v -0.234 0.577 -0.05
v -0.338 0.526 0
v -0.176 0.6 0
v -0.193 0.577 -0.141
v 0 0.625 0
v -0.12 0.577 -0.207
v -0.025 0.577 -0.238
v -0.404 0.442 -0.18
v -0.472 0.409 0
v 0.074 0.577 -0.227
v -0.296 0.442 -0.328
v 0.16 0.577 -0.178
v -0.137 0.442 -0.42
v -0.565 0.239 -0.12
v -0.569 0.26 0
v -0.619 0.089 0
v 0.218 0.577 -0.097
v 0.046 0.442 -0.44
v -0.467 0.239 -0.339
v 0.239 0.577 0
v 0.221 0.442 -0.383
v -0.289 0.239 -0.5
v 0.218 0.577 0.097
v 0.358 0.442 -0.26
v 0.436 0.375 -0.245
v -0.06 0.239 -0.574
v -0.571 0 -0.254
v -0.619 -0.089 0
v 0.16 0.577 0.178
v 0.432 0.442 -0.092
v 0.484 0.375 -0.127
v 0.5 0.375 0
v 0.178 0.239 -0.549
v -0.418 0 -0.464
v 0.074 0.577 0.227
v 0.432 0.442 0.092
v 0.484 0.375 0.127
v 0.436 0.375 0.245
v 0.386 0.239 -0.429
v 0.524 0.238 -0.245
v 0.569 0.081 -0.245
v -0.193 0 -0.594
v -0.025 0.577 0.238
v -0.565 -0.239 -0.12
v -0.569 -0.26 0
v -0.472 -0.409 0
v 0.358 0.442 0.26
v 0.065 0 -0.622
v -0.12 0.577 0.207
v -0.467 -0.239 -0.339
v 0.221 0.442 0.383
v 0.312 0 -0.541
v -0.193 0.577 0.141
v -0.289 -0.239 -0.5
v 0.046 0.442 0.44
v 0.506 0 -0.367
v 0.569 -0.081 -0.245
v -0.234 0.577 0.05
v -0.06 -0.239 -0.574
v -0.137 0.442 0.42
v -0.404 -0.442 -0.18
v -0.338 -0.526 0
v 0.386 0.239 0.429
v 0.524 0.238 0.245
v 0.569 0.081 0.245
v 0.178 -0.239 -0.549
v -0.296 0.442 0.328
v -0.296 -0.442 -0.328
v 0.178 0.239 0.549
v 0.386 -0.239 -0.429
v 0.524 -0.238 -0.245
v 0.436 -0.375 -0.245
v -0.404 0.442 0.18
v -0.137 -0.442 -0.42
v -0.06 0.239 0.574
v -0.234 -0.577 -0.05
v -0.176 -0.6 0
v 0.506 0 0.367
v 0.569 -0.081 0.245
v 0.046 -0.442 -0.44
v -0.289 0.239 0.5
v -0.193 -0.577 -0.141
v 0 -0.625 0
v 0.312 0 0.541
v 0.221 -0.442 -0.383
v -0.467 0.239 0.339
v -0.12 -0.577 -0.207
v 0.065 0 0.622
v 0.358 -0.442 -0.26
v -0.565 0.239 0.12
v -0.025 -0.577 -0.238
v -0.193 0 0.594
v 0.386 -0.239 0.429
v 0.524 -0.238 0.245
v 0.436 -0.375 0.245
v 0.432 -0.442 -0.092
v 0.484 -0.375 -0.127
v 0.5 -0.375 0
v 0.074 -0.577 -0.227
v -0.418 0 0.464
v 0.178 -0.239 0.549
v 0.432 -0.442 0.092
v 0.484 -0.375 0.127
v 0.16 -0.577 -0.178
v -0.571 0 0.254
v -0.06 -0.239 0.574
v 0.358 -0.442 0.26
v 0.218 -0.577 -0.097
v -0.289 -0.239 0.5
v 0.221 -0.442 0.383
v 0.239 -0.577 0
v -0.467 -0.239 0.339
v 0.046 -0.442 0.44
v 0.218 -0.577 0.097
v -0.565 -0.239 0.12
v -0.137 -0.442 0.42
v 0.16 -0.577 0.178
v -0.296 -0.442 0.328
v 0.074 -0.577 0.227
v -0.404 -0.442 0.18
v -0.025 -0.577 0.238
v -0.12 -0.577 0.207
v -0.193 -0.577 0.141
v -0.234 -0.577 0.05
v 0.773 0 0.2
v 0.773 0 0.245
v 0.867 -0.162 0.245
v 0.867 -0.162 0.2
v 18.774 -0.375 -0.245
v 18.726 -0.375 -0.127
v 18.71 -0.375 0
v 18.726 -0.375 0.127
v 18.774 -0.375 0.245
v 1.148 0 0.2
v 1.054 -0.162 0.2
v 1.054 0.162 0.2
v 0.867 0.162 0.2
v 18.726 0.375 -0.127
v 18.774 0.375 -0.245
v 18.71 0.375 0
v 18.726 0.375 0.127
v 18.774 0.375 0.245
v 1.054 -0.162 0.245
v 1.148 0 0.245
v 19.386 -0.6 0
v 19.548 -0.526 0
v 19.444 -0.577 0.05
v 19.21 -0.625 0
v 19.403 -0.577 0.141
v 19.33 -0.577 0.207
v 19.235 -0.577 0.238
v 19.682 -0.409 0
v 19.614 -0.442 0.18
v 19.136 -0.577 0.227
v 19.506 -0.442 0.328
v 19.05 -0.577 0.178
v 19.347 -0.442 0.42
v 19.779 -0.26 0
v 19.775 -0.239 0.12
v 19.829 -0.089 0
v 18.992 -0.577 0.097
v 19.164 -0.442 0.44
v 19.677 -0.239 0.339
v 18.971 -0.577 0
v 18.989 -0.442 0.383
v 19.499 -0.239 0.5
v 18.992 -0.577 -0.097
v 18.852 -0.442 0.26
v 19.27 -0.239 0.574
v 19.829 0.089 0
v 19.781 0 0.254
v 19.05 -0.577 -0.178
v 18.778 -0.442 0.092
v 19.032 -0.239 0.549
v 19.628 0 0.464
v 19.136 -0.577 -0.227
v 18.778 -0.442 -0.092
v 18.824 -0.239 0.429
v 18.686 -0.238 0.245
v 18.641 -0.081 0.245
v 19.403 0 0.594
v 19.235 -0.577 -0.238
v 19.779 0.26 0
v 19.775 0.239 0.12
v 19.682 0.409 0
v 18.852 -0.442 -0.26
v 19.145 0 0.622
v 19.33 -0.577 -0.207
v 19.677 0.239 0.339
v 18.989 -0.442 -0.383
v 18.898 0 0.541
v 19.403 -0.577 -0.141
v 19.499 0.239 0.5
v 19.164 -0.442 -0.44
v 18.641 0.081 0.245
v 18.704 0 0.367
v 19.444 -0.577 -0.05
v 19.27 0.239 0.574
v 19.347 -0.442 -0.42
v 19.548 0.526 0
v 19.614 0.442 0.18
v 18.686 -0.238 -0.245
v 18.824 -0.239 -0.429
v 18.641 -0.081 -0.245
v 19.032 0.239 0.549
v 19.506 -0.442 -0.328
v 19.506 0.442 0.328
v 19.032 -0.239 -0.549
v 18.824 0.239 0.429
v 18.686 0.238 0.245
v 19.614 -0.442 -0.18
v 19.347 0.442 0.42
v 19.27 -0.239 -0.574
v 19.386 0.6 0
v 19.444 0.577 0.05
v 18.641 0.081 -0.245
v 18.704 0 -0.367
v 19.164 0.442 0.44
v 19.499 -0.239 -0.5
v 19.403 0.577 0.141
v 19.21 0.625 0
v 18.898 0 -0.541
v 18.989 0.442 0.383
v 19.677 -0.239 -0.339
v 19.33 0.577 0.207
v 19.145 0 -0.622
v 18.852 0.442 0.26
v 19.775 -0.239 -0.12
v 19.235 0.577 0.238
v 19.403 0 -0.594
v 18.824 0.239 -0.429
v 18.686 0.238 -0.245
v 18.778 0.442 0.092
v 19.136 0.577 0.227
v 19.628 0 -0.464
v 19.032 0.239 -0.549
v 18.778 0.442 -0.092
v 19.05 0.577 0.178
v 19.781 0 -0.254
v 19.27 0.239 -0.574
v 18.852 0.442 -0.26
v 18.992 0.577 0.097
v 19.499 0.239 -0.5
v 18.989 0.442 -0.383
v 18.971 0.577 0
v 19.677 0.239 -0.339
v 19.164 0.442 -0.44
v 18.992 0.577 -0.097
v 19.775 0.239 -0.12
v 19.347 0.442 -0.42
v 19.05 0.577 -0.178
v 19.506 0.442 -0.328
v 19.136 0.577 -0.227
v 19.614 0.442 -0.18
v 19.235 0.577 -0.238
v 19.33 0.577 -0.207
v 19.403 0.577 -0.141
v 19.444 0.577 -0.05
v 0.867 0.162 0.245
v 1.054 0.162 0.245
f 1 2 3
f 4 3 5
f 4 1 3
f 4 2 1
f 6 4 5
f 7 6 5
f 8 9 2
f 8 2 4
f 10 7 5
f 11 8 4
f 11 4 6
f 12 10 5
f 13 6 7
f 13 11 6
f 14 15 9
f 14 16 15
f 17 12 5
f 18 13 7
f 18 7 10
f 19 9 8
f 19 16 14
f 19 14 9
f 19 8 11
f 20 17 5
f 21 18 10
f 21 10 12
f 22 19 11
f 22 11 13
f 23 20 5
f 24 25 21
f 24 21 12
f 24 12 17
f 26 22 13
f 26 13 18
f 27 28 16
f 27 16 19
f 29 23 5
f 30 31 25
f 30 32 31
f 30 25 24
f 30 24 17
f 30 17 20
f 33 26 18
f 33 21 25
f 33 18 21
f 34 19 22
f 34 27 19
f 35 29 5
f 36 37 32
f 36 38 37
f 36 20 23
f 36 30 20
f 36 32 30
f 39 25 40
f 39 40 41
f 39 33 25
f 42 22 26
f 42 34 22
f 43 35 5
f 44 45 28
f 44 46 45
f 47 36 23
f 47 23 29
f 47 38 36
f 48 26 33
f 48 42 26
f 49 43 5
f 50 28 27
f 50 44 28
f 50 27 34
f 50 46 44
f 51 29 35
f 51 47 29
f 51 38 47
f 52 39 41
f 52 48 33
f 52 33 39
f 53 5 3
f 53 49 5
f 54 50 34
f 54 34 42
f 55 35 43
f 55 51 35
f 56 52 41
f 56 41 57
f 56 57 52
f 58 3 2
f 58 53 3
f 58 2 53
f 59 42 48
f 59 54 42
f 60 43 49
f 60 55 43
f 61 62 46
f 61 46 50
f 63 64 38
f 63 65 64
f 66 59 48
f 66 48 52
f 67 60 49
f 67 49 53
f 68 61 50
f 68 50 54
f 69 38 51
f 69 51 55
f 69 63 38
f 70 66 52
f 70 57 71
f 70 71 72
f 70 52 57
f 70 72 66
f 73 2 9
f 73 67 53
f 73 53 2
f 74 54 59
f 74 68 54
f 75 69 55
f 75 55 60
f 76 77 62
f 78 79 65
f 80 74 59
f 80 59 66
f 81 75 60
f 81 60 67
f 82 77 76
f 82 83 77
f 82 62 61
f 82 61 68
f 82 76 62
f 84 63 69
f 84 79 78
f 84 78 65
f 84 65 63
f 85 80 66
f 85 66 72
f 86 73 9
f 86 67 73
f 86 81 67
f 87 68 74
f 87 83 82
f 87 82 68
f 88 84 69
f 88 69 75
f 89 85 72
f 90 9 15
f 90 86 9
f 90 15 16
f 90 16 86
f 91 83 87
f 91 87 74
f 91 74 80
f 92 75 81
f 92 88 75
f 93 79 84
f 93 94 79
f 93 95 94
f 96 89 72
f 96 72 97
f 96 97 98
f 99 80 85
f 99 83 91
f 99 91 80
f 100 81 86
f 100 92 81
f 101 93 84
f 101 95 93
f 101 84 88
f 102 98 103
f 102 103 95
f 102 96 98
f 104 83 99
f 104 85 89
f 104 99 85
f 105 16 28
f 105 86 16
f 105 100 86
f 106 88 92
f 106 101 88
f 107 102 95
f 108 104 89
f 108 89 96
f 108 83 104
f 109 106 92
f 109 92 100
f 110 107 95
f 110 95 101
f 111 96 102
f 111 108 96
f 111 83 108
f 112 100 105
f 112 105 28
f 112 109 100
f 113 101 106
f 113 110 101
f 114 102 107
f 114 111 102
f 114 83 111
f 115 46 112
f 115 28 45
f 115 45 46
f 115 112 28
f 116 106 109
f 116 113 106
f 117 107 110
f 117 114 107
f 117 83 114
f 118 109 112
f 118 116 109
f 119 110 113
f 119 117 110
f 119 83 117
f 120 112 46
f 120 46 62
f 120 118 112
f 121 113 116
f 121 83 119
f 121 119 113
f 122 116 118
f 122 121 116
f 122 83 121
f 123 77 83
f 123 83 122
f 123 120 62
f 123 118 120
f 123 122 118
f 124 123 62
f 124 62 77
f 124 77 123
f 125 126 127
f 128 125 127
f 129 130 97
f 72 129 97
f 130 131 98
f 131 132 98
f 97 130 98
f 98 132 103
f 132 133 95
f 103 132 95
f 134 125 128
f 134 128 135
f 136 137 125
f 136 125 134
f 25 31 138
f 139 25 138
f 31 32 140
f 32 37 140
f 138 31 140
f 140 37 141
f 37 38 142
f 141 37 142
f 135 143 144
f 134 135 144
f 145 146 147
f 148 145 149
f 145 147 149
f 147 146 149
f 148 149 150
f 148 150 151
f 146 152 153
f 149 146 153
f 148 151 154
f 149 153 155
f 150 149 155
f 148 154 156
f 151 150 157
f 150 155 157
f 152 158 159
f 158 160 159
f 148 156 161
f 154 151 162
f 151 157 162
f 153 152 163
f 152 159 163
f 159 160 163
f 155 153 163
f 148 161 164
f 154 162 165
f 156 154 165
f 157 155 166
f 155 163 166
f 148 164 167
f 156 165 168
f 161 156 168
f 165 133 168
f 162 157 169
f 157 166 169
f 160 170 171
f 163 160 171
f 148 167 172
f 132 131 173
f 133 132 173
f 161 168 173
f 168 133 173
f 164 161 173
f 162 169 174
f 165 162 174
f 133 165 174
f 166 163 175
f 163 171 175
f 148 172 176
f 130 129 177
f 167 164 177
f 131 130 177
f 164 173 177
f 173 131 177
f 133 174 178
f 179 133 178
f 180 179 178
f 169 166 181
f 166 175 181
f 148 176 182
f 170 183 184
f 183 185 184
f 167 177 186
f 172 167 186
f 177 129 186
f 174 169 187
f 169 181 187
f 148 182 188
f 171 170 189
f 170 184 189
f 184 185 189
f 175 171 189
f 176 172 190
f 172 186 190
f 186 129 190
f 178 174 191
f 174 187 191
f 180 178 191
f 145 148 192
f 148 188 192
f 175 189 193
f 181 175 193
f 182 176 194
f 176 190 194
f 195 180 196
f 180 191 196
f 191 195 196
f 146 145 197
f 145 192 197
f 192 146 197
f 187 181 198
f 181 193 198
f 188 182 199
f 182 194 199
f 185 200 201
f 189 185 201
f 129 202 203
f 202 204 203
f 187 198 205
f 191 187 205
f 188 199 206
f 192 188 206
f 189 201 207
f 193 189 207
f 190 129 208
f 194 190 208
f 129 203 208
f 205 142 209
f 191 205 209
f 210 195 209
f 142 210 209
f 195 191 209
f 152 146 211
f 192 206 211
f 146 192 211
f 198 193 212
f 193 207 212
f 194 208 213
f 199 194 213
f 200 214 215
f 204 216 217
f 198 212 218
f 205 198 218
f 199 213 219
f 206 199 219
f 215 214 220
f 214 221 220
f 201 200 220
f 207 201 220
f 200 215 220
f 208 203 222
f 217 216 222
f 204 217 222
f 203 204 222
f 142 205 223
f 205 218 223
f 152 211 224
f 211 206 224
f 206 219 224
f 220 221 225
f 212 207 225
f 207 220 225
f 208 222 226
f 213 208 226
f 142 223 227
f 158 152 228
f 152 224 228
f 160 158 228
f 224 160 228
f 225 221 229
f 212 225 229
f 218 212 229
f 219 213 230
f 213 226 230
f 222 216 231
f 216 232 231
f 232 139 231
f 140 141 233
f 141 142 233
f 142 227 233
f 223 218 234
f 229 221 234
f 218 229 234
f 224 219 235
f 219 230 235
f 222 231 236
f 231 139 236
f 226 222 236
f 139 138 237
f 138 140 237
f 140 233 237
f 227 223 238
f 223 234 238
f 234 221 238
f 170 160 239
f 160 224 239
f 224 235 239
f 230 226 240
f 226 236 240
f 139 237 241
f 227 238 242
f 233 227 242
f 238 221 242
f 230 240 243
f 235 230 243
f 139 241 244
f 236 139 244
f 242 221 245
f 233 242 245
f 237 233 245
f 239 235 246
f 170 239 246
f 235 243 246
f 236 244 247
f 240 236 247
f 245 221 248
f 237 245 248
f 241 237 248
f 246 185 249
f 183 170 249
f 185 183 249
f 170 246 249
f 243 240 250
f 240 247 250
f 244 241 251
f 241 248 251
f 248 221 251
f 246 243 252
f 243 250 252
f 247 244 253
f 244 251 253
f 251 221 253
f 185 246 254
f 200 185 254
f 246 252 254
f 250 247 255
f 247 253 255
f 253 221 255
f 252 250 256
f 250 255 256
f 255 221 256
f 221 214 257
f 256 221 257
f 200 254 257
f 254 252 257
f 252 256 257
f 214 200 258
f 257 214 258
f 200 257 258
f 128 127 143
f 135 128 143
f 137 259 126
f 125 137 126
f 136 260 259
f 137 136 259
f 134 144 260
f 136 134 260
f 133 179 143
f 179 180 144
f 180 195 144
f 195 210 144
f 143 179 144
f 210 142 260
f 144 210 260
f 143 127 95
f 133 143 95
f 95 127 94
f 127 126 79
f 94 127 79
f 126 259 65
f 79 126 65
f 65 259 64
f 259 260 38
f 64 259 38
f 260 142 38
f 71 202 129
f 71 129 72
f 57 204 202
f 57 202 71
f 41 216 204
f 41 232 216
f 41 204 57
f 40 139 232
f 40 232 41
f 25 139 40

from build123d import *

# Parameters (mm, degrees)
PAD_DEPTH    = 0.245
POCKET_DEPTH = 0.05


with BuildPart() as part:
    # Sketch → Pad (new body, symmetric)
    with BuildSketch(Plane.XY):
        with BuildLine():
            Line((0, 0.375), (19.21, 0.375))
            ThreePointArc((19.21, -0.375), (19.585, 0), (19.21, 0.375))
            Line((19.21, -0.375), (0, -0.375))
            ThreePointArc((0, 0.375), (-0.375, 0), (0, -0.375))
        make_face()
    extrude(amount=PAD_DEPTH, both=True)

    # Sketch001 → Revolution (revolve)
    with BuildSketch(Plane.XY):
        with BuildLine():
            Line((0, 0.625), (0, 0))
            Line((0, 0), (0, -0.625))
            ThreePointArc((0, 0.625), (-0.625, 0), (0, -0.625))
        make_face()
    revolve(axis=Axis((0, 0, 0), (0, -1, 0)))

    # Sketch002 → Revolution001 (revolve)
    with BuildSketch(Plane.XY):
        with BuildLine():
            ThreePointArc((19.21, -0.625), (19.835, 0), (19.21, 0.625))
            Line((19.21, 0.625), (19.21, 0))
            Line((19.21, 0), (19.21, -0.625))
        make_face()
    revolve(axis=Axis((19.21, 0, 0), (0, -1, 0)))

    # Sketch003 (on DatumPlane) → Pocket (cut)
    with BuildSketch(Plane.XY.offset(0.25)):
        Polygon((1.05425, -0.16238), (1.148, 0), (1.05425, 0.16238), (0.86675, 0.16238), (0.773, 0), (0.86675, -0.16238), align=None)
    extrude(amount=-POCKET_DEPTH, mode=Mode.SUBTRACT)


solid = part.part
